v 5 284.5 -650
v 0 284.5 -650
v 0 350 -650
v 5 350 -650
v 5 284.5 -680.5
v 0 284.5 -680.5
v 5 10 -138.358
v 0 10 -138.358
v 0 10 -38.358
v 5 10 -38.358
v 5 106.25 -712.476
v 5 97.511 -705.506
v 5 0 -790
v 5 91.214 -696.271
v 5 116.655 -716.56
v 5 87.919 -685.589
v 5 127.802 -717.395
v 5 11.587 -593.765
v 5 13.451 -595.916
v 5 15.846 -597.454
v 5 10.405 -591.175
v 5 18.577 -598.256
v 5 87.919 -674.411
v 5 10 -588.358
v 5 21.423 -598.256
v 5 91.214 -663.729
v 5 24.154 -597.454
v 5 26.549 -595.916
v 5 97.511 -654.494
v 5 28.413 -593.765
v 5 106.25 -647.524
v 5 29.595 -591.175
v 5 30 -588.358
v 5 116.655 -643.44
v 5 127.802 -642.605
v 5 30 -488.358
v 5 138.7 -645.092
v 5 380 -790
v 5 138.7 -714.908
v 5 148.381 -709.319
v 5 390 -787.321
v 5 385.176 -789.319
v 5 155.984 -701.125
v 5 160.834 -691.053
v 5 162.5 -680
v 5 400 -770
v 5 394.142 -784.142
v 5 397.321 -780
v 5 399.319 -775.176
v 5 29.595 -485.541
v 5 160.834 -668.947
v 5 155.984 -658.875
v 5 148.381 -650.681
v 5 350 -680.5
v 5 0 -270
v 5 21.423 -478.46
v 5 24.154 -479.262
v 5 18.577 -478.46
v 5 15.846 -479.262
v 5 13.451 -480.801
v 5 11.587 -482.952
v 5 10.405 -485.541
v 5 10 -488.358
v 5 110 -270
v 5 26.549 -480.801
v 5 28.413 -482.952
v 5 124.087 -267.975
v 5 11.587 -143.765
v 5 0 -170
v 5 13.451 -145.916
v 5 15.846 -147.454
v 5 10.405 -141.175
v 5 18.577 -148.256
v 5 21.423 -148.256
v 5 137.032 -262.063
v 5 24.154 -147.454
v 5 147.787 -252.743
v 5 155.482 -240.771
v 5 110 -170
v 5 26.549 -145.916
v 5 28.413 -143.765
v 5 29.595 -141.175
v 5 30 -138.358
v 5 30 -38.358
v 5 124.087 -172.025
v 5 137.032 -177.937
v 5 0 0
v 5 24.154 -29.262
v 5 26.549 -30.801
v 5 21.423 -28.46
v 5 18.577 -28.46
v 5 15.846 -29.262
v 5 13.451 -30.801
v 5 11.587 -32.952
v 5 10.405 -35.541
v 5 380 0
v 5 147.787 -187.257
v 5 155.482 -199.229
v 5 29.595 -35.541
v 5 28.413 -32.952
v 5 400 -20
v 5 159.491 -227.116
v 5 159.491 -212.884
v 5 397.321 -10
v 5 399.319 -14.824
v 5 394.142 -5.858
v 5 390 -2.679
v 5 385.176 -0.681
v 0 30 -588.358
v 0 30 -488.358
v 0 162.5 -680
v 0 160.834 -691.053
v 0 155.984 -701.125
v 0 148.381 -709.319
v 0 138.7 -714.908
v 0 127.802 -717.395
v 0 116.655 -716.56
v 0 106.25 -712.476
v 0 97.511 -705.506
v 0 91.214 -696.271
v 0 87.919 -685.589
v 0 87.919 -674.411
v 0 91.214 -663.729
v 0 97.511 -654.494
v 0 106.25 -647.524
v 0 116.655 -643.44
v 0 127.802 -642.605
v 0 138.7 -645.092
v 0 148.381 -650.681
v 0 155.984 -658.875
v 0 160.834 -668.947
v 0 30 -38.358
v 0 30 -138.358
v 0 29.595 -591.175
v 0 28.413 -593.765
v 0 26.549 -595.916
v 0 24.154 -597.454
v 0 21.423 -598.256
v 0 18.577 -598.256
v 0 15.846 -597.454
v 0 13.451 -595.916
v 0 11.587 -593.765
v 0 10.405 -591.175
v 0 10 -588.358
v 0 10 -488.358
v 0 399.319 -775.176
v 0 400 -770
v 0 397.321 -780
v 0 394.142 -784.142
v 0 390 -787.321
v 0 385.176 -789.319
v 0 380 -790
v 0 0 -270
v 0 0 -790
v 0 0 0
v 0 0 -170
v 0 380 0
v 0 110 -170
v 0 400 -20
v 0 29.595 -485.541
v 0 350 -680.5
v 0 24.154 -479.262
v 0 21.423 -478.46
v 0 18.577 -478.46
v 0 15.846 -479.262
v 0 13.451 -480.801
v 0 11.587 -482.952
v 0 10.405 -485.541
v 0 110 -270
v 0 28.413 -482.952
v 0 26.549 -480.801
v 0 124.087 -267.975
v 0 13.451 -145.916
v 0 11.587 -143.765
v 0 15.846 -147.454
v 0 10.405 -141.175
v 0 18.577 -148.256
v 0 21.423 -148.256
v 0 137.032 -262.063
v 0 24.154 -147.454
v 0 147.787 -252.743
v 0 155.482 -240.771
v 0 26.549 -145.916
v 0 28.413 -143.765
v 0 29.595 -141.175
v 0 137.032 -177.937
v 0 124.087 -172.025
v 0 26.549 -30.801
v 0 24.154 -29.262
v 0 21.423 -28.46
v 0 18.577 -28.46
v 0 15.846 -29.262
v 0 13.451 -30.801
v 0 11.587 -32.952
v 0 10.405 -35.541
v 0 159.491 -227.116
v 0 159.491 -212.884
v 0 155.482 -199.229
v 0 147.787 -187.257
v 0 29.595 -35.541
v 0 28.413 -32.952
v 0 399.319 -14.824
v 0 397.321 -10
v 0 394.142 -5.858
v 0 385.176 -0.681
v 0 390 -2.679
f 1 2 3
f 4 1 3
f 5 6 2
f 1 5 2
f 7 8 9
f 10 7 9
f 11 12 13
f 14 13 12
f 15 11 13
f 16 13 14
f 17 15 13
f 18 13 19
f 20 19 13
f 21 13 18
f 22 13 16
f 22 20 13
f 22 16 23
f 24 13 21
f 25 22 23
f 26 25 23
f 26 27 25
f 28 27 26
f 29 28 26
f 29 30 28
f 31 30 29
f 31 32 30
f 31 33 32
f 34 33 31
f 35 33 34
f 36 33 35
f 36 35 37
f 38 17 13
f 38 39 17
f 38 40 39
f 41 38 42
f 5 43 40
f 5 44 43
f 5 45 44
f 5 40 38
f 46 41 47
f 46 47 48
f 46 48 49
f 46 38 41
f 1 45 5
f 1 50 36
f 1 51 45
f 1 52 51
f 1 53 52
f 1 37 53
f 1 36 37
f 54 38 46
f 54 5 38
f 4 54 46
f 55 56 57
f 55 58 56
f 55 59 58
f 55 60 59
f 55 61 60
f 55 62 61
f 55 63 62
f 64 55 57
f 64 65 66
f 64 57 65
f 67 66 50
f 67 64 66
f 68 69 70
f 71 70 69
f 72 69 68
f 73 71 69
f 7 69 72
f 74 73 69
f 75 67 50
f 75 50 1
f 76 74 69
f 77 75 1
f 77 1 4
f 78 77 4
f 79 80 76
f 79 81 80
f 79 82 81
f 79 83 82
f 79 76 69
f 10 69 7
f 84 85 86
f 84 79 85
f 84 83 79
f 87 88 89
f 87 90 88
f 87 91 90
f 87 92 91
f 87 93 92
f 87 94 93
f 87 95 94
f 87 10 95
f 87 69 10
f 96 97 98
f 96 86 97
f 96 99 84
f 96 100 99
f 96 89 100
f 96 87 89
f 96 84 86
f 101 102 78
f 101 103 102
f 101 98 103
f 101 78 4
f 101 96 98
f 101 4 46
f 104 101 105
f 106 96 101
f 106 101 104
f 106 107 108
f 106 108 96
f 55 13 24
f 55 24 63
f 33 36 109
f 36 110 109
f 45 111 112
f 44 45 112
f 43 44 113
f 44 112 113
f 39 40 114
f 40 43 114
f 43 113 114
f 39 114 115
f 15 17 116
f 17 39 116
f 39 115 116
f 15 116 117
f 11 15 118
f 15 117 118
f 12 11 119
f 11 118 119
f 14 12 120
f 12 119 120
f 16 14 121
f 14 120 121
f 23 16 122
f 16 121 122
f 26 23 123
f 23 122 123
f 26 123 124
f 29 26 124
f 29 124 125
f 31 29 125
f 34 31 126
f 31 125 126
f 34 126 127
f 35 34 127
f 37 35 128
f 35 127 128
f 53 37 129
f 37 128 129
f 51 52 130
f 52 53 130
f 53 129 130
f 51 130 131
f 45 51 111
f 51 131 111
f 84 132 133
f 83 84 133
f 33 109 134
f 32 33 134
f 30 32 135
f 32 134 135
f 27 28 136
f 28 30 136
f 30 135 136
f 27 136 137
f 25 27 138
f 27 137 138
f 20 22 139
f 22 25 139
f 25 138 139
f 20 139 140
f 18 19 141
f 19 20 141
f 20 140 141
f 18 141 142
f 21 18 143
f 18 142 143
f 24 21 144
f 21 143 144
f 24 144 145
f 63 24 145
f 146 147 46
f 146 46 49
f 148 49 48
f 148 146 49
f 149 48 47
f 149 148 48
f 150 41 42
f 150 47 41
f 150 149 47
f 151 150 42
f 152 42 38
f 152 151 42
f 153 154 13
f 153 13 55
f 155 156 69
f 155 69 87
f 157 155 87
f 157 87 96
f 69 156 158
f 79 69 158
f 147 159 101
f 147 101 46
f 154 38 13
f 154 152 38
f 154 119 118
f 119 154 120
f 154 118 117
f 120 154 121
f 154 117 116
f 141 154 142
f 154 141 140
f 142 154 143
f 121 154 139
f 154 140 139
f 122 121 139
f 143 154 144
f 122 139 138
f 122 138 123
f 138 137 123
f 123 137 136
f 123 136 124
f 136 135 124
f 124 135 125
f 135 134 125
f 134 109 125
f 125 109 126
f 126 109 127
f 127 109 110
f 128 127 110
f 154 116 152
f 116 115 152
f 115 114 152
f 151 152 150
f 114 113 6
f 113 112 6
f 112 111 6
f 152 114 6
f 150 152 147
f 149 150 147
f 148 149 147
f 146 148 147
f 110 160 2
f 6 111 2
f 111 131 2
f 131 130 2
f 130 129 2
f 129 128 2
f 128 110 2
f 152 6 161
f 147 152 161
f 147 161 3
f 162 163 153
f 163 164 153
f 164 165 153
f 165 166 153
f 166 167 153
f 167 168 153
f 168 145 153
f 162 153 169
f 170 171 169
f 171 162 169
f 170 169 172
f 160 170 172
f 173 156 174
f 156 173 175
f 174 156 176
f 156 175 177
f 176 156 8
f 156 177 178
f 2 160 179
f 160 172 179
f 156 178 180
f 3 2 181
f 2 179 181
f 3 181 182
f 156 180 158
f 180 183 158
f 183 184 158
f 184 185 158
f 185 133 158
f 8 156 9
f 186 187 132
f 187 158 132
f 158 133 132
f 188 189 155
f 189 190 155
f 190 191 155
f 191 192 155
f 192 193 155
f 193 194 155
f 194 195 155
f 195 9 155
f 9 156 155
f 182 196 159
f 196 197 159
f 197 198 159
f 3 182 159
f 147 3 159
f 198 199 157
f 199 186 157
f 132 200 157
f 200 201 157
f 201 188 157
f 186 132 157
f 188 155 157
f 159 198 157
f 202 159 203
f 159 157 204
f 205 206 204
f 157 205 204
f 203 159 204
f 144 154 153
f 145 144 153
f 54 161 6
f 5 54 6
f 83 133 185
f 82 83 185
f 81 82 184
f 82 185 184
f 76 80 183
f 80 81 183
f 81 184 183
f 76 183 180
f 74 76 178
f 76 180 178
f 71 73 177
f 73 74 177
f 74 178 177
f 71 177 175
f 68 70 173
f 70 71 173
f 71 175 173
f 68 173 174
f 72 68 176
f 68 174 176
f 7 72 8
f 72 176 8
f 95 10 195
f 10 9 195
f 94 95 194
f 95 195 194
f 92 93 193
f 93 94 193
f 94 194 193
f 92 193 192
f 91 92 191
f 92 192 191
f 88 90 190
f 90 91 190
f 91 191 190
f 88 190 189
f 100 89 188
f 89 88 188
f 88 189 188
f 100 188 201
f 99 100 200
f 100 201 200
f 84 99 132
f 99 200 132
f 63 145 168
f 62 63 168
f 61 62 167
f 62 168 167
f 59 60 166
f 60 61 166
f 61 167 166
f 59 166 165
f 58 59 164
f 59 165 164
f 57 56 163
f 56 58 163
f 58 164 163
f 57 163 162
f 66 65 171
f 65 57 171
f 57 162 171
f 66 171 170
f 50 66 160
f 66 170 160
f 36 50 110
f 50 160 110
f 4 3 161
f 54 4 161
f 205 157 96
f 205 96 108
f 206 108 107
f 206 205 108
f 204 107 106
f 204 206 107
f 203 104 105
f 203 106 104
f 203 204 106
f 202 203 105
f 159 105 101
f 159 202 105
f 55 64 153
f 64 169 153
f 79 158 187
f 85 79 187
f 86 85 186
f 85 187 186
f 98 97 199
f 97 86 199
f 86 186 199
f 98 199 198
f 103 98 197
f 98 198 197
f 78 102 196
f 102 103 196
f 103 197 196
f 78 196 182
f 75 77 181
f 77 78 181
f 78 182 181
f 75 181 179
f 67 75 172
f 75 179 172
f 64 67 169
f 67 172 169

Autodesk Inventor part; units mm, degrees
ref_plane "YZ Plane" through (0, 0, 0) normal (1, 0, 0) x (0, 1, 0)
ref_plane "XZ Plane" through (0, 0, 0) normal (0, 1, 0) x (-1, 0, 0)
ref_plane "XY Plane" through (0, 0, 0) normal (0, 0, 1) x (1, 0, 0)
sketch "Sketch1" plane through (0, 0, 0) normal (1, 0, 0) x (0, 1, 0)
  line L0 (0, 0) -> (380, 0)
  line L1 (400, -20) -> (400, -770)
  line L2 (380, -790) -> (0, -790)
  line L3 (0, -790) -> (0, 0)
  arc A0 (400, -20) -> (380, 0) centre (380, -20) ccw
  arc A1 (380, -790) -> (400, -770) centre (380, -770) ccw
  circle A2 centre (125, -680) radius 37.5
  line L4 (0, -170) -> (110, -170)
  line L5 (110, -270) -> (0, -270)
  line L6 (0, -270) -> (0, -170)
  arc A3 (110, -270) -> (110, -170) centre (110, -220) ccw
  line L7 (350, -680.5) -> (284.5, -680.5)
  line L8 (284.5, -680.5) -> (284.5, -650)
  line L9 (284.5, -650) -> (350, -650)
  line L10 (350, -650) -> (350, -680.5)
  line L11 (20, -588.3581) -> (20, -488.3581) construction
  line L12 (10, -588.3581) -> (10, -488.3581)
  line L13 (30, -488.3581) -> (30, -588.3581)
  arc A4 (10, -588.3581) -> (30, -588.3581) centre (20, -588.3581) ccw
  arc A5 (30, -488.3581) -> (10, -488.3581) centre (20, -488.3581) ccw
  arc A6 (10, -138.3581) -> (30, -138.3581) centre (20, -138.3581) ccw
  line L14 (20, -138.3581) -> (20, -38.3581) construction
  line L15 (10, -138.3581) -> (10, -38.3581)
  arc A7 (30, -38.3581) -> (10, -38.3581) centre (20, -38.3581) ccw
  line L16 (30, -38.3581) -> (30, -138.3581)
  point P0 (400, -790)
  point P1 (400, 0)
  point P2 (190, 0)
  point P3 (0, -270)
  point P4 (20, -538.3581)
  point P5 (30, -538.3581)
  point P6 (30, -88.3581)
  point P7 (20, -88.3581)
  dimension "d0" = 400
  dimension "d1" = 790
  dimension "d2" = 20
  dimension "d3" = 75
  dimension "d4" = 110
  dimension "d5" = 125
  dimension "d6" = 110
  dimension "d7" = 100
  dimension "d9" = 220
  dimension "d10" = 65.5
  dimension "d11" = 30.5
  dimension "d12" = 50
  dimension "d13" = 650
  dimension "d16" = 30
  dimension "d17" = 10
  dimension "d18" = 100
  dimension "d21" = 450
extrude "Extrusion1" add sketch "Sketch1" along normal blind 5 contours L0 A0 L1 A1 L2 L3 L5 A3 L4
properties part number "r2wall"
